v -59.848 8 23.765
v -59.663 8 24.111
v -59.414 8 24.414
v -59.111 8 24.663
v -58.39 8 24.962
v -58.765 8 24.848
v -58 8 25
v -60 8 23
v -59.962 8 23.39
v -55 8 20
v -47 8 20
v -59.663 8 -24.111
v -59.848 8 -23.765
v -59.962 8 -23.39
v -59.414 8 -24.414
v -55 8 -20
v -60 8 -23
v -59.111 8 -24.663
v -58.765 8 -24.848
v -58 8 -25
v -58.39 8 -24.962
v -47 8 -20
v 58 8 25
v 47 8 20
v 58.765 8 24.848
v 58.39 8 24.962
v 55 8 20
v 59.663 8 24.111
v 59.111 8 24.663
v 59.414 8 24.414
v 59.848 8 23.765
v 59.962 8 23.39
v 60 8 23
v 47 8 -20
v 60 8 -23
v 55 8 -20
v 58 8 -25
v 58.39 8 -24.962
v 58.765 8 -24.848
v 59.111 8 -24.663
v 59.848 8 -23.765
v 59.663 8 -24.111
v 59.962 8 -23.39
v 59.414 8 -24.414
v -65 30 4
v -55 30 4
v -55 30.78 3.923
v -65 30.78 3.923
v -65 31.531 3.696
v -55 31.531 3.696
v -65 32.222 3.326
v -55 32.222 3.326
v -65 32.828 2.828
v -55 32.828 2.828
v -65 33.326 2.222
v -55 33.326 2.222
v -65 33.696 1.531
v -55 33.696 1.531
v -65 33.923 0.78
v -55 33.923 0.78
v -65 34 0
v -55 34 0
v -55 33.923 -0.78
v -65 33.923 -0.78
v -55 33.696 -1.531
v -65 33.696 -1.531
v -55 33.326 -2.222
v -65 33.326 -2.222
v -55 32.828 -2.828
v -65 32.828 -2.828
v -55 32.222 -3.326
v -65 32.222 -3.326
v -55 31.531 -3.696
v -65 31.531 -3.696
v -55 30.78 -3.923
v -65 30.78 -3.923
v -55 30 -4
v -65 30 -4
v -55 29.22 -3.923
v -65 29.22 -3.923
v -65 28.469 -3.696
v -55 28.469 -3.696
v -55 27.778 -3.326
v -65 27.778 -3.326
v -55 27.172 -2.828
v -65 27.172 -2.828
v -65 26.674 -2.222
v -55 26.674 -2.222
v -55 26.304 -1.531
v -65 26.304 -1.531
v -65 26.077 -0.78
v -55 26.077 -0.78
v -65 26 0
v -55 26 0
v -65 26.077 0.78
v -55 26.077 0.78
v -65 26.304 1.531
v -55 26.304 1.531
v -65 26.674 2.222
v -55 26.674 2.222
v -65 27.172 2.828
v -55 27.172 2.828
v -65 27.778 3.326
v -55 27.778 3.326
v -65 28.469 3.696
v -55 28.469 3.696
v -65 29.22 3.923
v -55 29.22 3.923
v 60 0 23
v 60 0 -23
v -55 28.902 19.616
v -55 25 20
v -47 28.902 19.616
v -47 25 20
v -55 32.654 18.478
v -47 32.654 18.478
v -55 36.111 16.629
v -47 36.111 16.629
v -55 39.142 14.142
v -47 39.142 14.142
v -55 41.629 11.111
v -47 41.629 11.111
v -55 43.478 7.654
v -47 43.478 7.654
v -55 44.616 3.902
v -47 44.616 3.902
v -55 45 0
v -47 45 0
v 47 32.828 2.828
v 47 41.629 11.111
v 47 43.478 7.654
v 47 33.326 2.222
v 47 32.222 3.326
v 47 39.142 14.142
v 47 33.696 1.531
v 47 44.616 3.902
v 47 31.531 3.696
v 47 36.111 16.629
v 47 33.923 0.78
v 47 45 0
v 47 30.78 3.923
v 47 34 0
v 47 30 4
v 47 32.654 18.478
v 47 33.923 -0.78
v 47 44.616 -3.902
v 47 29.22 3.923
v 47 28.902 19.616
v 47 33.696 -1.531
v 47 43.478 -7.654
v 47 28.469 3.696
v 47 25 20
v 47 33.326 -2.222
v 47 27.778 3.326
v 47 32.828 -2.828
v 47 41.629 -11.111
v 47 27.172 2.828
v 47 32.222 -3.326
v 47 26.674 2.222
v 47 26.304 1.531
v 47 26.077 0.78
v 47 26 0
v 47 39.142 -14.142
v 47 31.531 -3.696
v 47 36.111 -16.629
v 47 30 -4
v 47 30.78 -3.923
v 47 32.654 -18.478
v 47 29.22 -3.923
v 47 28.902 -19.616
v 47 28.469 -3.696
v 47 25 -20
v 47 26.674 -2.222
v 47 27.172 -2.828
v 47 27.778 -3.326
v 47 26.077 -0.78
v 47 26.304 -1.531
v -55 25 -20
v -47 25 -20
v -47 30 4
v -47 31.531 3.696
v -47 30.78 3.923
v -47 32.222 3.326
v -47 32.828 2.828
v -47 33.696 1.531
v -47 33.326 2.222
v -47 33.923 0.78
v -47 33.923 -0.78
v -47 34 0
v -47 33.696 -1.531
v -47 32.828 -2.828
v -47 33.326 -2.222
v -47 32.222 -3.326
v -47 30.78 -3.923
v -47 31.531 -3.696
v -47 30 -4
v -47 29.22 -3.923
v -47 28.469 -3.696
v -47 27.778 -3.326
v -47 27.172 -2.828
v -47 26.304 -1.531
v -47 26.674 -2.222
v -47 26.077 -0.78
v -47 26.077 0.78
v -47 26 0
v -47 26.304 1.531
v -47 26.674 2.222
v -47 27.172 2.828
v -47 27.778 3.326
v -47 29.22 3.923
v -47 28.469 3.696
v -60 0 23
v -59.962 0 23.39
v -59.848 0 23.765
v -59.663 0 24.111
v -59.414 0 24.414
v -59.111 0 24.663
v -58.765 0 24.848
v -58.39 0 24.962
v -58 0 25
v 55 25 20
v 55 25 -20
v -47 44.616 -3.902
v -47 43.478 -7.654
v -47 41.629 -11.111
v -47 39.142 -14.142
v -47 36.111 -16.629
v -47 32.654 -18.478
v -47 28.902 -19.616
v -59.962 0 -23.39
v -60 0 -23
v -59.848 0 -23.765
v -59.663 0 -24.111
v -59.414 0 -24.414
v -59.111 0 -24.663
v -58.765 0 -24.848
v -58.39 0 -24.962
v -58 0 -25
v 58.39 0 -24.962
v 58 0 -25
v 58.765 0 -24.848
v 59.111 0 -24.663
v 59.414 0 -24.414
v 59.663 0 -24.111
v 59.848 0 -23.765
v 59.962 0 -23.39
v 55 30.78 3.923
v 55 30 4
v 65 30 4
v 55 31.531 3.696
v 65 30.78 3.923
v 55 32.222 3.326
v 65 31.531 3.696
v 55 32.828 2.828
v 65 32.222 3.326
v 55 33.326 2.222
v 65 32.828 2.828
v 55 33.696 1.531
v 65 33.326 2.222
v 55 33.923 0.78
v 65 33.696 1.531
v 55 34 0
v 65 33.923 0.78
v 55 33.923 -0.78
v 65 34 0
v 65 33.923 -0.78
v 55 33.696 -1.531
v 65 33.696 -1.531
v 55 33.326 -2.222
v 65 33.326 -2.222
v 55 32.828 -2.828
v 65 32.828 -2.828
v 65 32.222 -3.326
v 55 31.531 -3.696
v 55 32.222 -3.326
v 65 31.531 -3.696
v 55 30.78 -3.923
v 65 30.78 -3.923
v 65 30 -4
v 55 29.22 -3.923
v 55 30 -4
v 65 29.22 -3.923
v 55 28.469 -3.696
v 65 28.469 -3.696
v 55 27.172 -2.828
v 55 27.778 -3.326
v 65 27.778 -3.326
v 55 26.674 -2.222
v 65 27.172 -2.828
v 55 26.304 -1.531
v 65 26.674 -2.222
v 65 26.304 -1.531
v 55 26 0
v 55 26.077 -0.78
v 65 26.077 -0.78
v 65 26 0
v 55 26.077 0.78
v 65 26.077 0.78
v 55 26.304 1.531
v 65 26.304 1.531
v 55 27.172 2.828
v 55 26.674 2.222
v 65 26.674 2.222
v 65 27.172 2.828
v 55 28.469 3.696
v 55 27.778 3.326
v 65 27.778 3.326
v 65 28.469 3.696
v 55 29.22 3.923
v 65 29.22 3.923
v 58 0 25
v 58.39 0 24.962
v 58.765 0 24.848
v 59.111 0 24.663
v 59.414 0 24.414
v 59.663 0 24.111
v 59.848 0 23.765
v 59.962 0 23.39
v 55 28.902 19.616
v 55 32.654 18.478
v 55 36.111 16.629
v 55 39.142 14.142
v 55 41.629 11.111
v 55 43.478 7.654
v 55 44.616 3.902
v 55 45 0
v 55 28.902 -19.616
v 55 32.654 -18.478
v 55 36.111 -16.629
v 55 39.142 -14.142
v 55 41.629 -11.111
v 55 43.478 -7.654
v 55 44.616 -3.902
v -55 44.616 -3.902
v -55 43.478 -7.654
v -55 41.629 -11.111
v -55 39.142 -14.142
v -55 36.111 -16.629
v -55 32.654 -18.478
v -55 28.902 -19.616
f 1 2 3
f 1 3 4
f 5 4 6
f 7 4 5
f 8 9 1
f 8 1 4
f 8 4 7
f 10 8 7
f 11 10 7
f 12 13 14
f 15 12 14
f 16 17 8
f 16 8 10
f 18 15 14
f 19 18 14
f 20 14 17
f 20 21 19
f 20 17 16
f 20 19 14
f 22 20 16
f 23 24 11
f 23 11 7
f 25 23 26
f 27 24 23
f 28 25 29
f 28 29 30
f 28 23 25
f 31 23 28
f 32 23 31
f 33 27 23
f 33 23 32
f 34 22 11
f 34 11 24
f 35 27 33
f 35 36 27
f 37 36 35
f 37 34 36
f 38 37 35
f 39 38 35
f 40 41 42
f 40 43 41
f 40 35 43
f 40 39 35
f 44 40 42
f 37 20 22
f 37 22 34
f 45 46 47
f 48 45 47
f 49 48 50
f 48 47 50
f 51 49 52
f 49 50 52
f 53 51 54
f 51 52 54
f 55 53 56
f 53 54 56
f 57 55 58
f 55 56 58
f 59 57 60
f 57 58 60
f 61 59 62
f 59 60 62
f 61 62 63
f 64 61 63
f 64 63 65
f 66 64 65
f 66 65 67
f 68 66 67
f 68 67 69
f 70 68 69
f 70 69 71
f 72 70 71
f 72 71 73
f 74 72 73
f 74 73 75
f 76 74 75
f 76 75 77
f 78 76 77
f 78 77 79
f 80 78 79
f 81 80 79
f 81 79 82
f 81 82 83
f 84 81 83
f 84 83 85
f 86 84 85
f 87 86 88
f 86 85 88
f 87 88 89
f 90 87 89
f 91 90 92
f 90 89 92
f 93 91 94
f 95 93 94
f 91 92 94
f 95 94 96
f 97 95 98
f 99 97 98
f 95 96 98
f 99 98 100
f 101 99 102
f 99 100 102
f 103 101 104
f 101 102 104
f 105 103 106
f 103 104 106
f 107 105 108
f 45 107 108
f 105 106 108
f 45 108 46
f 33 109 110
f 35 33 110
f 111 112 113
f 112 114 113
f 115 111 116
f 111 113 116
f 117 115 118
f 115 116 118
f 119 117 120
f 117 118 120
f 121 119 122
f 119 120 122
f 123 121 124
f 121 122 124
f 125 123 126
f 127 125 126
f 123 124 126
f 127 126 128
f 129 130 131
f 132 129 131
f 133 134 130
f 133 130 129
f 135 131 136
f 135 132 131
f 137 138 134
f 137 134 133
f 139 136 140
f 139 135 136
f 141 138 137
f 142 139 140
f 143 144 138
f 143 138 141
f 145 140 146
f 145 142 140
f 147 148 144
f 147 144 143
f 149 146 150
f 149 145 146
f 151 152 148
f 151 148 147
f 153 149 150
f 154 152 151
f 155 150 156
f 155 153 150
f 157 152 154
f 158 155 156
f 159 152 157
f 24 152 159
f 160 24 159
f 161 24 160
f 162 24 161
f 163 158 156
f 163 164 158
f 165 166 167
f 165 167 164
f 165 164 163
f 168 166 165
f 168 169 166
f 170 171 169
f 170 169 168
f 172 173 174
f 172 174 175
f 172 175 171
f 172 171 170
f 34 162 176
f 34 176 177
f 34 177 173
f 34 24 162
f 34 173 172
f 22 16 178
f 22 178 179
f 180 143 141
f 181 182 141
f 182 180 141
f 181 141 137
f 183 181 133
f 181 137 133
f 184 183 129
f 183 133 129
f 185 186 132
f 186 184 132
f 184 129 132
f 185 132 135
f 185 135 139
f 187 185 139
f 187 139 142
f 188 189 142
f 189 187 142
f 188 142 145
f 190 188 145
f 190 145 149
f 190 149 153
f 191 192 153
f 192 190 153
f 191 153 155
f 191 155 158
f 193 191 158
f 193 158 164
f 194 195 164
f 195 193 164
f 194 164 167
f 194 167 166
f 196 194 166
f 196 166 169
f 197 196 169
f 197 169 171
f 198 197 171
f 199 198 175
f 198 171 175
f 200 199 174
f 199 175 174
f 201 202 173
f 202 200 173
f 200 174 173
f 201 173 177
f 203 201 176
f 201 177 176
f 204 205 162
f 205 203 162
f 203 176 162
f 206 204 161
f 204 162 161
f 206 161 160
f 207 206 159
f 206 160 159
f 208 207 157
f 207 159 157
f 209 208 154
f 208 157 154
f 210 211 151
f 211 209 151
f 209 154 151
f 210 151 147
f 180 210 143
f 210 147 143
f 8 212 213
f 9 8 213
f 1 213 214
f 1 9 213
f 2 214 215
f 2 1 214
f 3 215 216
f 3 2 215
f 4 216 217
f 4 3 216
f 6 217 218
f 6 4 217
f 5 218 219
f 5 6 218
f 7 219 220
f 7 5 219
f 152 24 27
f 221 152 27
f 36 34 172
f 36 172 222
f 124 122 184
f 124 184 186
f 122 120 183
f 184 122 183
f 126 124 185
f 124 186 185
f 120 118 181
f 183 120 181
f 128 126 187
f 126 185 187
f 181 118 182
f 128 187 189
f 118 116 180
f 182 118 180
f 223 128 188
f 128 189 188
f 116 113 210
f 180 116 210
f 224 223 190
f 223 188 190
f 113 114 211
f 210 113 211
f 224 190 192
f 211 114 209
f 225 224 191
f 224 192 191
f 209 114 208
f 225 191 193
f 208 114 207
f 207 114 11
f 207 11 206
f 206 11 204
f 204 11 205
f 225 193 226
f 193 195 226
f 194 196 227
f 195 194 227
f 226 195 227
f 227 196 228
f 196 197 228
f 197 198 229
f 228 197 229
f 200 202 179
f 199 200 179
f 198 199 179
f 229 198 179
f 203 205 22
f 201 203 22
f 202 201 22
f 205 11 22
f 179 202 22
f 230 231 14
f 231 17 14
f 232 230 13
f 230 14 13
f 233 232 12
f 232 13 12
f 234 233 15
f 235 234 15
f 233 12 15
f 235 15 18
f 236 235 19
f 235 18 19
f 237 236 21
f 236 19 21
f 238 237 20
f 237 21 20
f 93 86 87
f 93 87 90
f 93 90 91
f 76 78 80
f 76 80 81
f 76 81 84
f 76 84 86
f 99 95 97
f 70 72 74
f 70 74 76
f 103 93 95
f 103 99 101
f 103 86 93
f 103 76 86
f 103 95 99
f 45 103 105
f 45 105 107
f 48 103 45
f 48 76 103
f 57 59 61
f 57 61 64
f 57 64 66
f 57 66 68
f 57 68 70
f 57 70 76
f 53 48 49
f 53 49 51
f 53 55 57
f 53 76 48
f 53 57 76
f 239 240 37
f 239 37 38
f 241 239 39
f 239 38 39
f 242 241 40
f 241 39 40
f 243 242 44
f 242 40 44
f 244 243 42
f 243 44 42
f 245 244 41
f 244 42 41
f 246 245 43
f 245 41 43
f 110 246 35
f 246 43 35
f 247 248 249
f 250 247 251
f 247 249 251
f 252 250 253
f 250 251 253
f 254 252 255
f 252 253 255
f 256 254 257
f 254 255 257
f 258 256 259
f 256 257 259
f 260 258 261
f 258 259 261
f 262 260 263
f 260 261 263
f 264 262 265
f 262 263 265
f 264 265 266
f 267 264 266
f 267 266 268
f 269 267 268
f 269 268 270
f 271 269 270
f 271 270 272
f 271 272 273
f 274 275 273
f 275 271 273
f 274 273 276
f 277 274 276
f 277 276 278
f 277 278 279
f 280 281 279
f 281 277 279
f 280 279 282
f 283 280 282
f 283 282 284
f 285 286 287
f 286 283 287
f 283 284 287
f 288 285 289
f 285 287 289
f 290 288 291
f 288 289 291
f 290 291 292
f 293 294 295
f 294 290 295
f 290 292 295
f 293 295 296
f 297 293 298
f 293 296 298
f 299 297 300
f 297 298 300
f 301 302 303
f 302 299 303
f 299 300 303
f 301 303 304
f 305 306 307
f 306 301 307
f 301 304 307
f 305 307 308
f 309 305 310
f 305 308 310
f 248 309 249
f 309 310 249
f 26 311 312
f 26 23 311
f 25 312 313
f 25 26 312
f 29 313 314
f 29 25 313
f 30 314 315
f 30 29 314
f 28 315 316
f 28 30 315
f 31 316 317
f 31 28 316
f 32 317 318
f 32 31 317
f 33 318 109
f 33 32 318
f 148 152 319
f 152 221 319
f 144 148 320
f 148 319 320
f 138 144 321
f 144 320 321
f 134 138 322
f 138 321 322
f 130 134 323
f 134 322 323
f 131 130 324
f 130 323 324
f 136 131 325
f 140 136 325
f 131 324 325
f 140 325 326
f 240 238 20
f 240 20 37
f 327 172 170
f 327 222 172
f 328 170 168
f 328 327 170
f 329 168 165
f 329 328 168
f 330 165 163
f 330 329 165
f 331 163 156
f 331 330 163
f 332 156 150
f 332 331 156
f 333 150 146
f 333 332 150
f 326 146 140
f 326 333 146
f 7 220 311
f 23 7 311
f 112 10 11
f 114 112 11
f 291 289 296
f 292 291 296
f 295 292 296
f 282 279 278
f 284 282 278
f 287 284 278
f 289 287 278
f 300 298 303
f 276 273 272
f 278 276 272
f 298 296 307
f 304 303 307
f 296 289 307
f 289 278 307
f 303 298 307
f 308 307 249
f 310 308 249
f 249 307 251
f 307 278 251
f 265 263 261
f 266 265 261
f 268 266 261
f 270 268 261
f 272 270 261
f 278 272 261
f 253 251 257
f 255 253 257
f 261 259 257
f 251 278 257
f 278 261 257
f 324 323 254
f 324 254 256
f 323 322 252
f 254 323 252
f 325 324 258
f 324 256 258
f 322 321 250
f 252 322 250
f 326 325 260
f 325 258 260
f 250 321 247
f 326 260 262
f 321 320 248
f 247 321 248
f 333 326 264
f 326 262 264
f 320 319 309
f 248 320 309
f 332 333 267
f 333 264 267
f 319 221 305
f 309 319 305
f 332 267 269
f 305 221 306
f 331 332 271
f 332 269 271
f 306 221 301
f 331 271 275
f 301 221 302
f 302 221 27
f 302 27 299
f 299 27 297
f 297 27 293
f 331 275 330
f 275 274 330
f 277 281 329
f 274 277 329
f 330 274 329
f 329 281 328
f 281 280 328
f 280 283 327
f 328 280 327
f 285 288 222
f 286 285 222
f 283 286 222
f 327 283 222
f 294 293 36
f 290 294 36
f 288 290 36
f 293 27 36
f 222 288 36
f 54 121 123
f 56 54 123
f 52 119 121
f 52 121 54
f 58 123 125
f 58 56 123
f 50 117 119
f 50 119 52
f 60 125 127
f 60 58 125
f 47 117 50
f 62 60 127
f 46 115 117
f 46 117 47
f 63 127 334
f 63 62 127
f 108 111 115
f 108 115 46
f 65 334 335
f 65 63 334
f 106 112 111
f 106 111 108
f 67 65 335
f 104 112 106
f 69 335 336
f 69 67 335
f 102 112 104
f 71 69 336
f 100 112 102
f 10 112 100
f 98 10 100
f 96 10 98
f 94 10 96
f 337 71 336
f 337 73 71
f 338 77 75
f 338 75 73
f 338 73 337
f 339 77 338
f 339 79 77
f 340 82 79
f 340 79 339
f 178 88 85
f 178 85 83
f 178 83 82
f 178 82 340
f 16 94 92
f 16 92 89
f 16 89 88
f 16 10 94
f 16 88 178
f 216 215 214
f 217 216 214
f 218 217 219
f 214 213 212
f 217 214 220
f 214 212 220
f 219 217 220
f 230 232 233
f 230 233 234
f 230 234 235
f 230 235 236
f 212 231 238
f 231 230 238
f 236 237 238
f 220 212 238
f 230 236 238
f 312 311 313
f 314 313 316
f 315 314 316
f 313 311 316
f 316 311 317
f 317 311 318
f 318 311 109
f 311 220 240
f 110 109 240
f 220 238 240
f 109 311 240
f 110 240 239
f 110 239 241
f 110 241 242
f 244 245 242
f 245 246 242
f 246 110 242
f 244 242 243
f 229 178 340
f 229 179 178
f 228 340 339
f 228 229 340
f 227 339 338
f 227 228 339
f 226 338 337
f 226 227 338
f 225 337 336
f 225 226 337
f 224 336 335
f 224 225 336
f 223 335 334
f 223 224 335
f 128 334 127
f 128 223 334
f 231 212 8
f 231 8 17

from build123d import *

# Parameters (mm, degrees)
SKETCH1_W                = 120
SKETCH1_H                = 50
BOSS_EXTRUDE1_DEPTH      = 8
SKETCH2_W                = 8
SKETCH2_H                = 40
BOSS_EXTRUDE2_DEPTH      = 37
FILLET1_R                = 20
BOSS_EXTRUDE3_DEPTH      = 10
BOSS_EXTRUDE3_DEPTH_BACK = 120
SKETCH3_R                = 4
FILLET2_R                = 2


with BuildPart() as part:
    # Sketch1 → Boss-Extrude1 (new body)
    with BuildSketch(Plane(origin=(0, 0, 0), x_dir=(1, 0, 0), z_dir=(0, 1, 0))):
        Rectangle(SKETCH1_W, SKETCH1_H)
    extrude(amount=BOSS_EXTRUDE1_DEPTH)

    # Sketch2 → Boss-Extrude2 (add)
    with BuildSketch(Plane(origin=(0, 8, 0), x_dir=(1, 0, 0), z_dir=(0, 1, 0))):
        with Locations((-51, 0)):
            Rectangle(SKETCH2_W, SKETCH2_H)
        with Locations((51, 0)):
            Rectangle(SKETCH2_W, SKETCH2_H)
    extrude(amount=BOSS_EXTRUDE2_DEPTH)

    # Fillet1
    fillet1_edges = [part.edges().sort_by_distance(p)[0] for p in [
        (51, 45, -20),
        (51, 45, 20),
        (-51, 45, -20),
        (-51, 45, 20),
    ]]
    fillet(fillet1_edges, radius=FILLET1_R - 0.0001)  # a hair under: the kernel refuses the full size

    # Sketch3 → Boss-Extrude3 (add, two sides: drawn at the far end of the back side and taken through both)
    with BuildSketch(Plane.ZY.offset(55).offset(-BOSS_EXTRUDE3_DEPTH_BACK)):
        with Locations((0, 30)):
            Circle(SKETCH3_R)
    extrude(amount=BOSS_EXTRUDE3_DEPTH + BOSS_EXTRUDE3_DEPTH_BACK)

    # Fillet2
    fillet2_edges = [part.edges().sort_by_distance(p)[0] for p in [
        (-60, 4, -25),
        (60, 4, -25),
        (60, 4, 25),
        (-60, 4, 25),
    ]]
    fillet(fillet2_edges, radius=FILLET2_R)


solid = part.part
